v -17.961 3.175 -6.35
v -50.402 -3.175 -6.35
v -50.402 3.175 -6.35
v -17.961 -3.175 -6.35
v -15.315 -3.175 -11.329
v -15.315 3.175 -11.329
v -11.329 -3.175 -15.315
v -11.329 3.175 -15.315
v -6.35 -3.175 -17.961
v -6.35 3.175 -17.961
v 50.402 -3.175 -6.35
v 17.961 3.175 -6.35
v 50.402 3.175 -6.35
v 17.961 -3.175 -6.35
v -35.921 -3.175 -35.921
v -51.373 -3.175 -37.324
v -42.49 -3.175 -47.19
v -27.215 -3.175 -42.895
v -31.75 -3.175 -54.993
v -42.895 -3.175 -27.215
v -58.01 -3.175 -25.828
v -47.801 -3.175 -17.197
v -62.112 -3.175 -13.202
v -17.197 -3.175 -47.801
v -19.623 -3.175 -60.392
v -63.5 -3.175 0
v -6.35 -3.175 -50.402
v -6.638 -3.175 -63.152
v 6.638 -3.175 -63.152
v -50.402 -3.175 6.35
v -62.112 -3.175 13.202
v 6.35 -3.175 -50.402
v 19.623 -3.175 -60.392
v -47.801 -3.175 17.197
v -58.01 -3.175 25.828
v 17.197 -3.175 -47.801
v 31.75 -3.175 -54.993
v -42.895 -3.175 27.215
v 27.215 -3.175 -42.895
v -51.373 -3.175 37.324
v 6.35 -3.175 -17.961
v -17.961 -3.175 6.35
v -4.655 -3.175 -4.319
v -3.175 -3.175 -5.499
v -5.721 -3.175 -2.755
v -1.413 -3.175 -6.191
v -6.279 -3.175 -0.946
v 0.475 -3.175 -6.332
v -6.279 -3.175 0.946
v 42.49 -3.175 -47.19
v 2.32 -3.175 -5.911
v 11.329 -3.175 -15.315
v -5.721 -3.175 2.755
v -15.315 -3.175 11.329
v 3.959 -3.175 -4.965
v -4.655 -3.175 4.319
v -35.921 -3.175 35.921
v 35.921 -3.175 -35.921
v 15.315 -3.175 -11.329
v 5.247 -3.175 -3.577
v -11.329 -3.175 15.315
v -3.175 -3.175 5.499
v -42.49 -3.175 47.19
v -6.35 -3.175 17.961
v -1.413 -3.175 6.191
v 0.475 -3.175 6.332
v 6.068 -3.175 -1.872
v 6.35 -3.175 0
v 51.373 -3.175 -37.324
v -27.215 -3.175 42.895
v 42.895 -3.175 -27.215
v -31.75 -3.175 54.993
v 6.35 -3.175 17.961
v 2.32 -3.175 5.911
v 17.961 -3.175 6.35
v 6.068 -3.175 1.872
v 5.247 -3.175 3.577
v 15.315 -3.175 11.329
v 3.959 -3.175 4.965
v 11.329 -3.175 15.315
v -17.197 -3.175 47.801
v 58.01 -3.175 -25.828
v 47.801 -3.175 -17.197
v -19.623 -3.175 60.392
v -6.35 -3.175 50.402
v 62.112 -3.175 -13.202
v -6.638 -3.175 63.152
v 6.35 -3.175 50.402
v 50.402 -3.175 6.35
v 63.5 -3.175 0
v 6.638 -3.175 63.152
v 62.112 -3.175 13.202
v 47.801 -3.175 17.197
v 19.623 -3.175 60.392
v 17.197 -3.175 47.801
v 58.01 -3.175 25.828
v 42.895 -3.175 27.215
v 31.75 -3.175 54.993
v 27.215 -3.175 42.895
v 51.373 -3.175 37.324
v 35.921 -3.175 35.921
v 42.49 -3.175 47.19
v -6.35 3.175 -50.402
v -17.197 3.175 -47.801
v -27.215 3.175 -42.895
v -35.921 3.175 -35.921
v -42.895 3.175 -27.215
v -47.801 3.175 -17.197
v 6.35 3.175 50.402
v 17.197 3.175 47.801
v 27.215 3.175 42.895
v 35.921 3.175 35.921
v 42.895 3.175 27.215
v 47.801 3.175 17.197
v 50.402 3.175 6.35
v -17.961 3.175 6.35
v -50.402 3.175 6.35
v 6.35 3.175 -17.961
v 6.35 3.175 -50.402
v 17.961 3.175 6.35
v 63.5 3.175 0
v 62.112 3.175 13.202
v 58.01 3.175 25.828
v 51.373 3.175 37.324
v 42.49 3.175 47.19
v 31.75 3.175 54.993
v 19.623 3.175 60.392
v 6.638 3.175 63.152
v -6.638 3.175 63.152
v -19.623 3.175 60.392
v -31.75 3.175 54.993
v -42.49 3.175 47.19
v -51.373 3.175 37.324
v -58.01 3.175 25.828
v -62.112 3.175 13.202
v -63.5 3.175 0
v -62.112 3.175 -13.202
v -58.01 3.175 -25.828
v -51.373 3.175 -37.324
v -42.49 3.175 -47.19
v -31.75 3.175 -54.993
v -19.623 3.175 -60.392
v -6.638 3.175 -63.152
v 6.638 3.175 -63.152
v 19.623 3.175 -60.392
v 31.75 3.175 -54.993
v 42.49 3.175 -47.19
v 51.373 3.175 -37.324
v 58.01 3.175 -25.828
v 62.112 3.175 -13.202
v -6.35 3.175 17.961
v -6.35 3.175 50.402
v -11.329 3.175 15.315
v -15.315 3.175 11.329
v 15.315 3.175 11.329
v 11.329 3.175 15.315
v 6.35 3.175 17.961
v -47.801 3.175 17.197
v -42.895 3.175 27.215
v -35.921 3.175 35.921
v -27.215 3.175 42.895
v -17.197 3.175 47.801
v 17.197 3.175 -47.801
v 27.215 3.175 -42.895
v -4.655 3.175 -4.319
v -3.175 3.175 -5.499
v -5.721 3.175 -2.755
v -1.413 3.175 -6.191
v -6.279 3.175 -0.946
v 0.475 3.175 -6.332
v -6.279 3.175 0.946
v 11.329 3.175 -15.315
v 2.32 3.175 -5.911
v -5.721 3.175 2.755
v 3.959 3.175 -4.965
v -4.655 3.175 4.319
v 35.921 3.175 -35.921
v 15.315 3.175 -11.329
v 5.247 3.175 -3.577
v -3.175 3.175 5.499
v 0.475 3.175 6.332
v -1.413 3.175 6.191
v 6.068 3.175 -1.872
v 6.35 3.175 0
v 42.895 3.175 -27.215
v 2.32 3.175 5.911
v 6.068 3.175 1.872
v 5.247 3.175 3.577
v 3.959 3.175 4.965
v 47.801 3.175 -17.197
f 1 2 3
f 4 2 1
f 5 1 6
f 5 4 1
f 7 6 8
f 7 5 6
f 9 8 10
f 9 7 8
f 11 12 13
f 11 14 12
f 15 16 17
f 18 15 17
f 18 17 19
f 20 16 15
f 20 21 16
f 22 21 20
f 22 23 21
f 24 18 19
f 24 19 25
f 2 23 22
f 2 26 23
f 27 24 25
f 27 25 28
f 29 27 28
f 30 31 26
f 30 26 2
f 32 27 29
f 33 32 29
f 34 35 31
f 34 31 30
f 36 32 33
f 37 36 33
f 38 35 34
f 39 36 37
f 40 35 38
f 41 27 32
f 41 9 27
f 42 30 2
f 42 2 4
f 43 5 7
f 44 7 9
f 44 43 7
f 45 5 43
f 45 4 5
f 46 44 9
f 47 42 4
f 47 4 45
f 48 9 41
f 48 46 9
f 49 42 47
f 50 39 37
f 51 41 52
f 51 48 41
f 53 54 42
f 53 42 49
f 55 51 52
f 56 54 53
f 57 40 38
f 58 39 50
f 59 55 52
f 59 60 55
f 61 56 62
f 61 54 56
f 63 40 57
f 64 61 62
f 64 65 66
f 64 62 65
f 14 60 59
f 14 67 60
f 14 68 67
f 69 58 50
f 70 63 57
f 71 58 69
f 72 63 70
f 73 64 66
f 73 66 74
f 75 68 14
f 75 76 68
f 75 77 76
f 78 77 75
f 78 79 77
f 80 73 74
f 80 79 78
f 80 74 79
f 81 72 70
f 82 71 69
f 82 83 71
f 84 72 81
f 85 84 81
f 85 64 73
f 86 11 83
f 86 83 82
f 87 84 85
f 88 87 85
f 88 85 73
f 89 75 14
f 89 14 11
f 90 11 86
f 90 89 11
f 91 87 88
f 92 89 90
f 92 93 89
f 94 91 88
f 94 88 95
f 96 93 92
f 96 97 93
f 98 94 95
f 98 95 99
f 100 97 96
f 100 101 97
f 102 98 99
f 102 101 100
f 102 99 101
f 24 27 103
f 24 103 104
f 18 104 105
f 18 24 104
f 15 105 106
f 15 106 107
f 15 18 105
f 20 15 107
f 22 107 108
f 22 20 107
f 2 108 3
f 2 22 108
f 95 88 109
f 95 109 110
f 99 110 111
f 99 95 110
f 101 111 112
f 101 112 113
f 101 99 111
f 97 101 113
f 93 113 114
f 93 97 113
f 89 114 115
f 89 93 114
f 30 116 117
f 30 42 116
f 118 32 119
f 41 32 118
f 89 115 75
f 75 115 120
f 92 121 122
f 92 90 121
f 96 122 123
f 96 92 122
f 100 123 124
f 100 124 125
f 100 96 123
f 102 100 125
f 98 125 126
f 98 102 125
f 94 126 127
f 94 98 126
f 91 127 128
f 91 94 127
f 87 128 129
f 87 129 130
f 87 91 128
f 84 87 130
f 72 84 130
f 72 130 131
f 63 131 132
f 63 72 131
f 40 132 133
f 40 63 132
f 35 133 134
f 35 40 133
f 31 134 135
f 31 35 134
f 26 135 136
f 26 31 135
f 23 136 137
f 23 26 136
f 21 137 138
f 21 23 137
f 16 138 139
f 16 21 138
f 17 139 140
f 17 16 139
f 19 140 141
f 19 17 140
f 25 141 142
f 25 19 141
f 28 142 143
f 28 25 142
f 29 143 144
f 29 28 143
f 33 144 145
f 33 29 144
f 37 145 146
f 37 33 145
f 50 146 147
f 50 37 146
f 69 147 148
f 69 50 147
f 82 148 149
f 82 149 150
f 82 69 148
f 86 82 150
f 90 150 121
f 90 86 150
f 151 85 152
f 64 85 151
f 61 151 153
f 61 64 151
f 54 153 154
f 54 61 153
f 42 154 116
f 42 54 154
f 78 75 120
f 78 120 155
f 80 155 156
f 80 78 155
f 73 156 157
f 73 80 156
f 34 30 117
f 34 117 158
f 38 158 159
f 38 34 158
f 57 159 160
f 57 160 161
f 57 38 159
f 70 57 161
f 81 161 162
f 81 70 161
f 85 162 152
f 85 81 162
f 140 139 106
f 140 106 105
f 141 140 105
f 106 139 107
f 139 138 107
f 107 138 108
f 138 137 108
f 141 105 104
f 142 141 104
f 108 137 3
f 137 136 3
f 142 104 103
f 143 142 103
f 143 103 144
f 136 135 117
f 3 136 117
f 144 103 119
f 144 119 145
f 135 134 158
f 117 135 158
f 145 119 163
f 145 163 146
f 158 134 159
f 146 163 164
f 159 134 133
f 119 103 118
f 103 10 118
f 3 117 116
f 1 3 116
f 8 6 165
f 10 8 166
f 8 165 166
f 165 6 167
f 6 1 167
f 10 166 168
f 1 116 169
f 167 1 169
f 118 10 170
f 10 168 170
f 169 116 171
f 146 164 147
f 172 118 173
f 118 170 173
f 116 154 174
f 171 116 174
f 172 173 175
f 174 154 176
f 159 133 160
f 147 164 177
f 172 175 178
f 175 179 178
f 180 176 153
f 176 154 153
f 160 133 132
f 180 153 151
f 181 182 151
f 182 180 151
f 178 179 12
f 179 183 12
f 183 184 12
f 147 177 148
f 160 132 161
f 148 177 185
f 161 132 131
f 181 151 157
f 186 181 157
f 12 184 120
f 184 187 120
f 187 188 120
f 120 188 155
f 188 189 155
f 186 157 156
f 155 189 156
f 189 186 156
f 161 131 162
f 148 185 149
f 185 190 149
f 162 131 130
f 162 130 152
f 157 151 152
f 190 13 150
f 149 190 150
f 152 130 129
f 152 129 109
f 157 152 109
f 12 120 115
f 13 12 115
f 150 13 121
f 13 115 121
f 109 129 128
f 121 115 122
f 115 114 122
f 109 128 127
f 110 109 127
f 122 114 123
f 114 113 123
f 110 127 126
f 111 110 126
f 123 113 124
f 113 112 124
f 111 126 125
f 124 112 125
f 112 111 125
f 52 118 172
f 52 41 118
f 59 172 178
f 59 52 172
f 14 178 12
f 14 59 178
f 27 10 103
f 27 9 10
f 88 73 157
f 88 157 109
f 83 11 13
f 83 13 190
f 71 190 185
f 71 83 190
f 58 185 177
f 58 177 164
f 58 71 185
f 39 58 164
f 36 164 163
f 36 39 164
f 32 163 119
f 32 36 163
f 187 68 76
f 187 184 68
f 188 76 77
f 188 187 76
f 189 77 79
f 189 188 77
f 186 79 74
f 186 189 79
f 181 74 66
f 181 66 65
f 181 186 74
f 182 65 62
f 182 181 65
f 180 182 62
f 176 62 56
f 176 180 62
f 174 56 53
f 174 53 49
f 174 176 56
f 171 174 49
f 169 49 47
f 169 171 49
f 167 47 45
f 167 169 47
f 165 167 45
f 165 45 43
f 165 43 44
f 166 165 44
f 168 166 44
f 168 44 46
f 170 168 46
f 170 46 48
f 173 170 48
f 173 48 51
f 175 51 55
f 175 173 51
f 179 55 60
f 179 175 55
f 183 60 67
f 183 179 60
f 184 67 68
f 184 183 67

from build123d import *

# Parameters (mm, degrees)
F0_R     = 63.5
F0_R_2   = 6.35
F1_DEPTH = 3.175


# Not quite as in the source:
# - a feature of the source that left no trace in its solid (it failed there, or was rolled back) is left out


with BuildPart() as f1:
    # F0 (on Front) → F1 (new body, symmetric)
    with BuildSketch(Plane.XZ):
        Circle(F0_R)
        with BuildLine():
            ThreePointArc((-6.35, -50.4015624758), (-35.9210244843, -35.9210244843), (-50.4015624758, -6.35))
            Line((-50.4015624758, -6.35), (-17.9605122421, -6.35))
            ThreePointArc((-17.9605122421, -6.35), (-13.4703841816, -13.4703841816), (-6.35, -17.9605122421))
            Line((-6.35, -17.9605122421), (-6.35, -50.4015624758))
        make_face(mode=Mode.SUBTRACT)
        with BuildLine():
            ThreePointArc((50.4015624758, -6.35), (35.9210244843, -35.9210244843), (6.35, -50.4015624758))
            Line((6.35, -50.4015624758), (6.35, -17.9605122421))
            ThreePointArc((6.35, -17.9605122421), (13.4703841816, -13.4703841816), (17.9605122421, -6.35))
            Line((17.9605122421, -6.35), (50.4015624758, -6.35))
        make_face(mode=Mode.SUBTRACT)
        with BuildLine():
            ThreePointArc((-50.4015624758, 6.35), (-35.9210244843, 35.9210244843), (-6.35, 50.4015624758))
            Line((-6.35, 50.4015624758), (-6.35, 17.9605122421))
            ThreePointArc((-6.35, 17.9605122421), (-13.4703841816, 13.4703841816), (-17.9605122421, 6.35))
            Line((-17.9605122421, 6.35), (-50.4015624758, 6.35))
        make_face(mode=Mode.SUBTRACT)
        Circle(F0_R_2, mode=Mode.SUBTRACT)
        with BuildLine():
            Line((50.4015624758, 6.35), (17.9605122421, 6.35))
            ThreePointArc((17.9605122421, 6.35), (13.4703841816, 13.4703841816), (6.35, 17.9605122421))
            Line((6.35, 17.9605122421), (6.35, 50.4015624758))
            ThreePointArc((6.35, 50.4015624758), (35.9210244843, 35.9210244843), (50.4015624758, 6.35))
        make_face(mode=Mode.SUBTRACT)
    extrude(amount=F1_DEPTH, both=True)


solid = f1.part
